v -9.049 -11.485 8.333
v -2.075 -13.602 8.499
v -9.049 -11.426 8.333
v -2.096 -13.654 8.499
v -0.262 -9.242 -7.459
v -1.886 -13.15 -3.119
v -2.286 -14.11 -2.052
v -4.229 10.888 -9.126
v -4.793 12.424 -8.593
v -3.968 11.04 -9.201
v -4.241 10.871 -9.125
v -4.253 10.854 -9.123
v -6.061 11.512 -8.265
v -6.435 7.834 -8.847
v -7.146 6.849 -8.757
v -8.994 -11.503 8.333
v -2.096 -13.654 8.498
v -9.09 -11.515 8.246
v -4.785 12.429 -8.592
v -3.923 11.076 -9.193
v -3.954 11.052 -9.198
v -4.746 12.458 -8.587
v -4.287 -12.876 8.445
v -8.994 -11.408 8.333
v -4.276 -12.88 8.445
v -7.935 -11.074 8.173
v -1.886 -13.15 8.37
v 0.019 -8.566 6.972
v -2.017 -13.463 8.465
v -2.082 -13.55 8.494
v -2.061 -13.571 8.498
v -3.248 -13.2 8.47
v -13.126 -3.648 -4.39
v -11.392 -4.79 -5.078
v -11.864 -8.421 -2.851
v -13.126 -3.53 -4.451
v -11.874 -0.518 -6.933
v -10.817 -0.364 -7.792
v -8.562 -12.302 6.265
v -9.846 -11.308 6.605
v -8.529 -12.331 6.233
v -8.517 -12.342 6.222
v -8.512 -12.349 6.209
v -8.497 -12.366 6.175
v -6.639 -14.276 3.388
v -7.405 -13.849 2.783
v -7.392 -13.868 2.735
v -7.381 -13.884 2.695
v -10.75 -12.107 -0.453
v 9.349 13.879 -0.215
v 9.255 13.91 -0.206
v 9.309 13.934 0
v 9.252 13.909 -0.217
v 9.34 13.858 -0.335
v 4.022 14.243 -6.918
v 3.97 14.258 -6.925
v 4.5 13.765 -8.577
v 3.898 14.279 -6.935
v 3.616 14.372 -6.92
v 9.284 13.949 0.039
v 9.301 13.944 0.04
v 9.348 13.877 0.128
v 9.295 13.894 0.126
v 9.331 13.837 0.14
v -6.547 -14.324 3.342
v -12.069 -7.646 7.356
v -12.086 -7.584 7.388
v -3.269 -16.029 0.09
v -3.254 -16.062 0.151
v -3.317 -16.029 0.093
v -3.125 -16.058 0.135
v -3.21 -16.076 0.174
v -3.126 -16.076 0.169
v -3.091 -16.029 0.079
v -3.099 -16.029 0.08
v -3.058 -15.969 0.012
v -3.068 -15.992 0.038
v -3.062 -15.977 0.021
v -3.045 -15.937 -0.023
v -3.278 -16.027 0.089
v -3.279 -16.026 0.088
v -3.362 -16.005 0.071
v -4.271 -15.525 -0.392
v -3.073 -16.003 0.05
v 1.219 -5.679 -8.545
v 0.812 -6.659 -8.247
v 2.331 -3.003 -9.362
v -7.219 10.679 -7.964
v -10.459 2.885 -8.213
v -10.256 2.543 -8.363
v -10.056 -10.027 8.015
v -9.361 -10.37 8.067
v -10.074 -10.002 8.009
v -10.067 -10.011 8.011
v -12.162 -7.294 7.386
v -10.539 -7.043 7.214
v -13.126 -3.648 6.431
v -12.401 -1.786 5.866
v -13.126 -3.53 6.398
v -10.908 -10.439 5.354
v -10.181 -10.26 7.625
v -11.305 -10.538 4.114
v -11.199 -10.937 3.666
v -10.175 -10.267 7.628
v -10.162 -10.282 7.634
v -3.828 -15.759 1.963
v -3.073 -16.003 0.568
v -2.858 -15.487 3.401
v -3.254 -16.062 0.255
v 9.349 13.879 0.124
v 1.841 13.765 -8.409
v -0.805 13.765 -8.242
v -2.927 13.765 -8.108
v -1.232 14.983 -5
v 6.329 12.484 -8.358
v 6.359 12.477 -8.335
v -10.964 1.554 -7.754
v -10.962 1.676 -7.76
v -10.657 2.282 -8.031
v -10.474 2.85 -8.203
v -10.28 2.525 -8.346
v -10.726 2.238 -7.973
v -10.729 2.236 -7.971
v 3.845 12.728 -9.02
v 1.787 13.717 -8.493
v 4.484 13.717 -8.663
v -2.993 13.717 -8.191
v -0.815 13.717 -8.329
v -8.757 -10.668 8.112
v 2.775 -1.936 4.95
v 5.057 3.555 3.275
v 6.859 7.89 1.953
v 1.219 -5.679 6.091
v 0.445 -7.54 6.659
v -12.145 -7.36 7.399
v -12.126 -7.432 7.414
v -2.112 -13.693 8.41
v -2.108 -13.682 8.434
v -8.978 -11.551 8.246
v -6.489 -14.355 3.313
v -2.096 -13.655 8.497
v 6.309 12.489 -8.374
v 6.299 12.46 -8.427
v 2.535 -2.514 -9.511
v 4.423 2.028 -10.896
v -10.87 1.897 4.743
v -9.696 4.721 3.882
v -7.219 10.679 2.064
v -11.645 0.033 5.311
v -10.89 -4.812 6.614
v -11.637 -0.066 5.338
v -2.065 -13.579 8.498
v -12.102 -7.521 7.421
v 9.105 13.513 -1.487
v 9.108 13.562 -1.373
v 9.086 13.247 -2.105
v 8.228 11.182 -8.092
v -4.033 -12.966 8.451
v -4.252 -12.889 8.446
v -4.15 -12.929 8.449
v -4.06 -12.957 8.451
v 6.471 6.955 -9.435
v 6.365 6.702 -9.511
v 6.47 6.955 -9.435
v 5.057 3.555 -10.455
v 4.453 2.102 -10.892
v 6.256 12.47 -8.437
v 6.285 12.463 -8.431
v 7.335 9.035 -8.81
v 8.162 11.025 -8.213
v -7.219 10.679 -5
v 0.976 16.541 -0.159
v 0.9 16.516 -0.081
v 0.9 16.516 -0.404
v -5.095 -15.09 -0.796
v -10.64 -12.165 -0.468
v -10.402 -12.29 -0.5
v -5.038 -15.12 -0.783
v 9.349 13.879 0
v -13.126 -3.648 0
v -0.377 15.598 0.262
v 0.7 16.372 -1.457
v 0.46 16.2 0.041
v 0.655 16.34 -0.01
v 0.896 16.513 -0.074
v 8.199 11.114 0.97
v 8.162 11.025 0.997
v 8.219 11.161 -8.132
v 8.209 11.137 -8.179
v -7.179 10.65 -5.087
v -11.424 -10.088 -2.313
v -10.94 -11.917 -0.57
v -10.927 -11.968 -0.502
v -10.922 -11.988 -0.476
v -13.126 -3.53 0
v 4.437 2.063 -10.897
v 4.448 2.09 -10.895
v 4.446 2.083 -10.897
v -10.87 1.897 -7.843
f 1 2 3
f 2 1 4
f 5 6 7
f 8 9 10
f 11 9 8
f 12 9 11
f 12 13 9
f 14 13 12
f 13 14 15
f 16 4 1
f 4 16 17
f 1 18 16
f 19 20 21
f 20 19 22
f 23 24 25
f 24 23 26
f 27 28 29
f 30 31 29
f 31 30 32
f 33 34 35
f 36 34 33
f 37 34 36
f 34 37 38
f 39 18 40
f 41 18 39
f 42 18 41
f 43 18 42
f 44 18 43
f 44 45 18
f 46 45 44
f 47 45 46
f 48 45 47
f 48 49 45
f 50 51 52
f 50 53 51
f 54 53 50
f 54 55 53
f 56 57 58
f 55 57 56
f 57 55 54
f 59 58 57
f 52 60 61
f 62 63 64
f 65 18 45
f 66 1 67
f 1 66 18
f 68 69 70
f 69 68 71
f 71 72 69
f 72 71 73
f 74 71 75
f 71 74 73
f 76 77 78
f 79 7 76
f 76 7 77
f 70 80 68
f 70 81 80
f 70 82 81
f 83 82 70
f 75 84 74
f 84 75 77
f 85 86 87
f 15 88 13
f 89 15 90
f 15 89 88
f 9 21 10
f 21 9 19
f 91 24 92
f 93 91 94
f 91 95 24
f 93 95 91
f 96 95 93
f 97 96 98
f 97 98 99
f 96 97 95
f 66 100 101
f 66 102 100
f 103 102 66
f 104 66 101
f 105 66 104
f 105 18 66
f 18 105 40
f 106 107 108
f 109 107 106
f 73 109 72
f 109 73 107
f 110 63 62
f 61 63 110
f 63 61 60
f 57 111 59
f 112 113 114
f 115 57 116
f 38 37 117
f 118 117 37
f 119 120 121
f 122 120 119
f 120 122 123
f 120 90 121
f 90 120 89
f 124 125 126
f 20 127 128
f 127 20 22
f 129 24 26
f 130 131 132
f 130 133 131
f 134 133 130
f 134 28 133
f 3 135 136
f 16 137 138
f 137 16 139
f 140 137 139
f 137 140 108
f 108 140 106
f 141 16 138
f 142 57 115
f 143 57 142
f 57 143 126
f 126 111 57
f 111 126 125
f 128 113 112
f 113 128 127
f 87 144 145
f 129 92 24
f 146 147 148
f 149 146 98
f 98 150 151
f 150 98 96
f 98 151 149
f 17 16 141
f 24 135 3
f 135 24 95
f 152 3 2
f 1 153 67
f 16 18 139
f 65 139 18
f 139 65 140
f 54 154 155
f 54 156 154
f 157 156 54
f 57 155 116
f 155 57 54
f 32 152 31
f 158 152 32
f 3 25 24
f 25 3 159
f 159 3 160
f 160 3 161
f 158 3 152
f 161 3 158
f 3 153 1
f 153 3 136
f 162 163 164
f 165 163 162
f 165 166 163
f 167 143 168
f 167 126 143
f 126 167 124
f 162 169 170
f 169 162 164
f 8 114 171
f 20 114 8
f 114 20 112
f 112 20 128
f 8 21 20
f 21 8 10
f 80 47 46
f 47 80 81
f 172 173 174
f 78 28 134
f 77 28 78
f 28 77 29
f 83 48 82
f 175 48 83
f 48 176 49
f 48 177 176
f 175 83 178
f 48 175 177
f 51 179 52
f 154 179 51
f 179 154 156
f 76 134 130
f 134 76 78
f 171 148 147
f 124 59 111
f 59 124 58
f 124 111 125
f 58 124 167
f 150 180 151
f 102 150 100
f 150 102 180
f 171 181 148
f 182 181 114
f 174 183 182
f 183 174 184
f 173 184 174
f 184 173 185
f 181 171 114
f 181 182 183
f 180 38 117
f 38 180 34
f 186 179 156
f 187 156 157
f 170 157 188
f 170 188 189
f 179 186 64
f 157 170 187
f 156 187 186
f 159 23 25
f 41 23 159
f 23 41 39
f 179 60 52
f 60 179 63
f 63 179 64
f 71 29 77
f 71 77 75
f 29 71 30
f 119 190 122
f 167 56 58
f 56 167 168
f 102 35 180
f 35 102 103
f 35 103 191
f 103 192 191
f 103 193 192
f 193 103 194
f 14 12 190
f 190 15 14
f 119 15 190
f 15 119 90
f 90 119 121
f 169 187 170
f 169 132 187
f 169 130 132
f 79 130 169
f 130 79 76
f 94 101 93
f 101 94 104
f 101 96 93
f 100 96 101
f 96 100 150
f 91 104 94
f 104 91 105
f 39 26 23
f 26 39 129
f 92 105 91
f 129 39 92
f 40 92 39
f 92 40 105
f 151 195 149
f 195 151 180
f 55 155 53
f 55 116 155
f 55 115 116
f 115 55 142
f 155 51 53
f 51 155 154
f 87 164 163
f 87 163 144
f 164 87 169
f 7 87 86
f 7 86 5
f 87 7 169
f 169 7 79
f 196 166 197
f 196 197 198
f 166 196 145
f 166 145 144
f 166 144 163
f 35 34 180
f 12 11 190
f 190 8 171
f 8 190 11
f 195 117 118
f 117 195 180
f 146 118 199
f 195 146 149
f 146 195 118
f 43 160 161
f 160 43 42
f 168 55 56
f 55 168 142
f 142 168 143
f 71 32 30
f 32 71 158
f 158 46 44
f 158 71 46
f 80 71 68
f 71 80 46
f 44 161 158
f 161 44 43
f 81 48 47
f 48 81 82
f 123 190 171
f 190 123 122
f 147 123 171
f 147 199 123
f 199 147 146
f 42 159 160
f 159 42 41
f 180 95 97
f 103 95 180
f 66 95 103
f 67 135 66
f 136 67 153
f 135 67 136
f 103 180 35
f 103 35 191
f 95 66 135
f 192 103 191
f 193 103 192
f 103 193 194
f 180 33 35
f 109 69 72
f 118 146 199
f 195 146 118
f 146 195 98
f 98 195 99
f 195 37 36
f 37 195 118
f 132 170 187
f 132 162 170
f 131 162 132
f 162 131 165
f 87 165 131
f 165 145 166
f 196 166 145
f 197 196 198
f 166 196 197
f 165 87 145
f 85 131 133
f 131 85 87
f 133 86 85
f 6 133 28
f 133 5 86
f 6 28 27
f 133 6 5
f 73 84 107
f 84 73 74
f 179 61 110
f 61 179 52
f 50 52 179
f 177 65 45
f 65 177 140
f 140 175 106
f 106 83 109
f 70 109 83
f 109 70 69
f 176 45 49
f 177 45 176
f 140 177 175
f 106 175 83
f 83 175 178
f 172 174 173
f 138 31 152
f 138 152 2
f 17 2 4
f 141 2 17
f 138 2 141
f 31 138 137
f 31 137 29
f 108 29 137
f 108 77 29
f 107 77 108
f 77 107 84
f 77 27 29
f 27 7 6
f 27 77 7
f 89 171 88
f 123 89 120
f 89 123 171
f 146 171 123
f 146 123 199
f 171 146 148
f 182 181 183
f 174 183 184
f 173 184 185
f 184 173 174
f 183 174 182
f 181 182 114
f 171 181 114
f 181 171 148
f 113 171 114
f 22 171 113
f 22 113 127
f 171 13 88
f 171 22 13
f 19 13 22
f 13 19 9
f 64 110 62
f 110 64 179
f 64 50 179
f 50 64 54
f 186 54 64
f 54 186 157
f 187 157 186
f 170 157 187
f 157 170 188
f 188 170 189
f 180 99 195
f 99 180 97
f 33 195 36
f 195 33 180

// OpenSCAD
// Auto-generated OpenSCAD file

    inner_points = 10*[[0.0981256772482181, 1.6457575604228036, -0.49999971188637654], [-1.0832035552174737, -1.1961778079047776, 0.5000005689987711], [-0.1274890829740991, 1.102996499198401, -1.309016652616536], [0.09812663002150081, 1.6457572632118638, 0.5000002881131254], [-1.0832045079907566, -1.1961775106938377, -0.49999943100073085], [-0.8575887949951567, -0.6534167466803746, 1.3090175097289307], [-0.4925404806041831, 0.22479035715641538, -1.618033560192892], [-0.127486588581261, 1.1029957210900594, 1.3090173361320547], [-0.8575912893879948, -0.6534159685720329, -1.3090164790196603], [-0.4925373973650727, 0.224789395361611, 1.6180344173052863], [0.8062478731875907, 1.1025170792040677, -0.951057064318678], [0.9248610728923187, 1.3878632992834963, -5.762265201658678e-07], [-0.317262991238858, -1.6003240717335458, -2.808858743374998e-07], [-0.19864979153413004, -1.314977851654117, 0.9510562072062835], [0.495716297128712, 0.3554704111460145, -1.5388422427756967], [0.8062496854700688, 1.102516513875266, 0.951055968270682], [-0.19865160381660824, -1.3149772863253153, -0.9510568253830763], [0.11188178452474858, -0.5679311835960638, 1.5388413856633023], [0.1118788521901014, -0.5679302688748477, -1.538842151510418], [0.4957192294633592, 0.3554694964247984, 1.5388412943980236], [-0.7138464220032689, 1.0620613123307217, -0.4999991117419643], [-1.3045110382361147, -0.3589063718330689, 1.0287006094733542e-06], [-0.7138454692299859, 1.062061015119782, 0.5000008882575375], [-1.0788962780137976, 0.18385468939133373, 0.8090179694307691], [-1.0788978196333527, 0.183855170288736, -0.8090160193183198]];

    outer_points = 10*[[-1.6409889130468513, -0.11555950142177197, -0.3126779904387301], [1.5886524541888336, -0.11555950142177197, -0.5165225244336256], [-1.348640822211601, 0.8007073739998204, -0.5865166414544996], [-1.3165303884764263, -1.0318263768433644, -0.07777018120554417], [1.2641939296184086, 0.8007073739998204, -0.7514303336668116], [1.2963043633535833, -1.0318263768433644, -0.24268387341785624], [-0.5511531501235996, 1.3669914457760302, -0.7946890769982492], [-0.4991973769465854, -1.5981104486195743, 0.028479987340757858], [0.4468609180885676, 1.3669914457760302, -0.8576805022131136], [0.4988166912655817, -1.5981104486195743, -0.03451143787410652], [-1.5180582313930455, 0.5972695048350894, 0.3778021724529971], [-1.5011767773548241, -0.3661505019915455, 0.6452660147863529], [1.5535132362128419, 0.5972695048350894, 0.1839345000860028], [1.5703946902510633, -0.3661505019915455, 0.4513983424193586], [-0.9450976637241996, 1.376692663078665, 0.12439394786230915], [-0.9009014432726172, -1.1455736602351207, 0.8246233778526778], [0.9532379021306351, 1.376692663078665, 0.004577137019677928], [0.9974341225822174, -1.1455736602351207, 0.7048065670100466], [-0.001146536984352193, 1.674405817908923, -0.018165330220834972], [0.05348299584236998, -1.4432868150653788, 0.8473658450931907], [-0.8699212728256985, -0.0032034345028971734, -0.9394401530094331], [0.744899410792144, -0.0032034345028971734, -1.0413624200068807], [-0.5454627482552734, -0.9194703099244896, -0.704532343776247], [0.4525513199568937, -0.9194703099244896, -0.7675237689911114], [-0.07243360073769692, 0.5630806372733126, -1.1476125885531827]];

    // Convex hull for inner set (I)
    module inner_hull() {
        hull() {
            for (p = inner_points) {
                translate(p) sphere(r=0.1);
            }
        }
    }

    // Convex hull for outer set (O) minus inner hull (O \ I)
    module outer_minus_inner() {
        difference() {
            hull() {
                for (p = outer_points) {
                    translate(p) sphere(r=0.1);
                }
            }
            inner_hull(); // Subtract inner hull
        }
    }

    // Convex hull for outer set (O) minus all translated inner hulls
    module outer_minus_AllTranslationInner() {
        difference() {
            hull() {
                for (p = outer_points) {
                    translate(p) sphere(r=0.1);
                }
            }
            hull() {
                translate([0,0,50]) inner_hull();
                translate([0,0,-50]) inner_hull();
            }; // Subtract translated inner hulls
        }
    }

    // Difference between outer_minus_inner and outer_minus_AllTranslationInner
    module outer_minus_inner_diff() {
        difference() {
            // Outer minus inner
            difference() {
                hull() {
                    for (p = outer_points) {
                        translate(p) sphere(r=0.1);
                    }
                }
                inner_hull();
            }

            // Subtract Outer minus AllTranslationInner
            difference() {
                hull() {
                    for (p = outer_points) {
                        translate(p) sphere(r=0.1);
                    }
                }
                hull() {
                    translate([0,0,50]) inner_hull();
                    translate([0,0,-50]) inner_hull();
                };
            }
        }
    }

    // Rendering all with colors applied
    color([1, 1, 0, 1]) outer_minus_inner_diff(); // Opaque yellow
    
